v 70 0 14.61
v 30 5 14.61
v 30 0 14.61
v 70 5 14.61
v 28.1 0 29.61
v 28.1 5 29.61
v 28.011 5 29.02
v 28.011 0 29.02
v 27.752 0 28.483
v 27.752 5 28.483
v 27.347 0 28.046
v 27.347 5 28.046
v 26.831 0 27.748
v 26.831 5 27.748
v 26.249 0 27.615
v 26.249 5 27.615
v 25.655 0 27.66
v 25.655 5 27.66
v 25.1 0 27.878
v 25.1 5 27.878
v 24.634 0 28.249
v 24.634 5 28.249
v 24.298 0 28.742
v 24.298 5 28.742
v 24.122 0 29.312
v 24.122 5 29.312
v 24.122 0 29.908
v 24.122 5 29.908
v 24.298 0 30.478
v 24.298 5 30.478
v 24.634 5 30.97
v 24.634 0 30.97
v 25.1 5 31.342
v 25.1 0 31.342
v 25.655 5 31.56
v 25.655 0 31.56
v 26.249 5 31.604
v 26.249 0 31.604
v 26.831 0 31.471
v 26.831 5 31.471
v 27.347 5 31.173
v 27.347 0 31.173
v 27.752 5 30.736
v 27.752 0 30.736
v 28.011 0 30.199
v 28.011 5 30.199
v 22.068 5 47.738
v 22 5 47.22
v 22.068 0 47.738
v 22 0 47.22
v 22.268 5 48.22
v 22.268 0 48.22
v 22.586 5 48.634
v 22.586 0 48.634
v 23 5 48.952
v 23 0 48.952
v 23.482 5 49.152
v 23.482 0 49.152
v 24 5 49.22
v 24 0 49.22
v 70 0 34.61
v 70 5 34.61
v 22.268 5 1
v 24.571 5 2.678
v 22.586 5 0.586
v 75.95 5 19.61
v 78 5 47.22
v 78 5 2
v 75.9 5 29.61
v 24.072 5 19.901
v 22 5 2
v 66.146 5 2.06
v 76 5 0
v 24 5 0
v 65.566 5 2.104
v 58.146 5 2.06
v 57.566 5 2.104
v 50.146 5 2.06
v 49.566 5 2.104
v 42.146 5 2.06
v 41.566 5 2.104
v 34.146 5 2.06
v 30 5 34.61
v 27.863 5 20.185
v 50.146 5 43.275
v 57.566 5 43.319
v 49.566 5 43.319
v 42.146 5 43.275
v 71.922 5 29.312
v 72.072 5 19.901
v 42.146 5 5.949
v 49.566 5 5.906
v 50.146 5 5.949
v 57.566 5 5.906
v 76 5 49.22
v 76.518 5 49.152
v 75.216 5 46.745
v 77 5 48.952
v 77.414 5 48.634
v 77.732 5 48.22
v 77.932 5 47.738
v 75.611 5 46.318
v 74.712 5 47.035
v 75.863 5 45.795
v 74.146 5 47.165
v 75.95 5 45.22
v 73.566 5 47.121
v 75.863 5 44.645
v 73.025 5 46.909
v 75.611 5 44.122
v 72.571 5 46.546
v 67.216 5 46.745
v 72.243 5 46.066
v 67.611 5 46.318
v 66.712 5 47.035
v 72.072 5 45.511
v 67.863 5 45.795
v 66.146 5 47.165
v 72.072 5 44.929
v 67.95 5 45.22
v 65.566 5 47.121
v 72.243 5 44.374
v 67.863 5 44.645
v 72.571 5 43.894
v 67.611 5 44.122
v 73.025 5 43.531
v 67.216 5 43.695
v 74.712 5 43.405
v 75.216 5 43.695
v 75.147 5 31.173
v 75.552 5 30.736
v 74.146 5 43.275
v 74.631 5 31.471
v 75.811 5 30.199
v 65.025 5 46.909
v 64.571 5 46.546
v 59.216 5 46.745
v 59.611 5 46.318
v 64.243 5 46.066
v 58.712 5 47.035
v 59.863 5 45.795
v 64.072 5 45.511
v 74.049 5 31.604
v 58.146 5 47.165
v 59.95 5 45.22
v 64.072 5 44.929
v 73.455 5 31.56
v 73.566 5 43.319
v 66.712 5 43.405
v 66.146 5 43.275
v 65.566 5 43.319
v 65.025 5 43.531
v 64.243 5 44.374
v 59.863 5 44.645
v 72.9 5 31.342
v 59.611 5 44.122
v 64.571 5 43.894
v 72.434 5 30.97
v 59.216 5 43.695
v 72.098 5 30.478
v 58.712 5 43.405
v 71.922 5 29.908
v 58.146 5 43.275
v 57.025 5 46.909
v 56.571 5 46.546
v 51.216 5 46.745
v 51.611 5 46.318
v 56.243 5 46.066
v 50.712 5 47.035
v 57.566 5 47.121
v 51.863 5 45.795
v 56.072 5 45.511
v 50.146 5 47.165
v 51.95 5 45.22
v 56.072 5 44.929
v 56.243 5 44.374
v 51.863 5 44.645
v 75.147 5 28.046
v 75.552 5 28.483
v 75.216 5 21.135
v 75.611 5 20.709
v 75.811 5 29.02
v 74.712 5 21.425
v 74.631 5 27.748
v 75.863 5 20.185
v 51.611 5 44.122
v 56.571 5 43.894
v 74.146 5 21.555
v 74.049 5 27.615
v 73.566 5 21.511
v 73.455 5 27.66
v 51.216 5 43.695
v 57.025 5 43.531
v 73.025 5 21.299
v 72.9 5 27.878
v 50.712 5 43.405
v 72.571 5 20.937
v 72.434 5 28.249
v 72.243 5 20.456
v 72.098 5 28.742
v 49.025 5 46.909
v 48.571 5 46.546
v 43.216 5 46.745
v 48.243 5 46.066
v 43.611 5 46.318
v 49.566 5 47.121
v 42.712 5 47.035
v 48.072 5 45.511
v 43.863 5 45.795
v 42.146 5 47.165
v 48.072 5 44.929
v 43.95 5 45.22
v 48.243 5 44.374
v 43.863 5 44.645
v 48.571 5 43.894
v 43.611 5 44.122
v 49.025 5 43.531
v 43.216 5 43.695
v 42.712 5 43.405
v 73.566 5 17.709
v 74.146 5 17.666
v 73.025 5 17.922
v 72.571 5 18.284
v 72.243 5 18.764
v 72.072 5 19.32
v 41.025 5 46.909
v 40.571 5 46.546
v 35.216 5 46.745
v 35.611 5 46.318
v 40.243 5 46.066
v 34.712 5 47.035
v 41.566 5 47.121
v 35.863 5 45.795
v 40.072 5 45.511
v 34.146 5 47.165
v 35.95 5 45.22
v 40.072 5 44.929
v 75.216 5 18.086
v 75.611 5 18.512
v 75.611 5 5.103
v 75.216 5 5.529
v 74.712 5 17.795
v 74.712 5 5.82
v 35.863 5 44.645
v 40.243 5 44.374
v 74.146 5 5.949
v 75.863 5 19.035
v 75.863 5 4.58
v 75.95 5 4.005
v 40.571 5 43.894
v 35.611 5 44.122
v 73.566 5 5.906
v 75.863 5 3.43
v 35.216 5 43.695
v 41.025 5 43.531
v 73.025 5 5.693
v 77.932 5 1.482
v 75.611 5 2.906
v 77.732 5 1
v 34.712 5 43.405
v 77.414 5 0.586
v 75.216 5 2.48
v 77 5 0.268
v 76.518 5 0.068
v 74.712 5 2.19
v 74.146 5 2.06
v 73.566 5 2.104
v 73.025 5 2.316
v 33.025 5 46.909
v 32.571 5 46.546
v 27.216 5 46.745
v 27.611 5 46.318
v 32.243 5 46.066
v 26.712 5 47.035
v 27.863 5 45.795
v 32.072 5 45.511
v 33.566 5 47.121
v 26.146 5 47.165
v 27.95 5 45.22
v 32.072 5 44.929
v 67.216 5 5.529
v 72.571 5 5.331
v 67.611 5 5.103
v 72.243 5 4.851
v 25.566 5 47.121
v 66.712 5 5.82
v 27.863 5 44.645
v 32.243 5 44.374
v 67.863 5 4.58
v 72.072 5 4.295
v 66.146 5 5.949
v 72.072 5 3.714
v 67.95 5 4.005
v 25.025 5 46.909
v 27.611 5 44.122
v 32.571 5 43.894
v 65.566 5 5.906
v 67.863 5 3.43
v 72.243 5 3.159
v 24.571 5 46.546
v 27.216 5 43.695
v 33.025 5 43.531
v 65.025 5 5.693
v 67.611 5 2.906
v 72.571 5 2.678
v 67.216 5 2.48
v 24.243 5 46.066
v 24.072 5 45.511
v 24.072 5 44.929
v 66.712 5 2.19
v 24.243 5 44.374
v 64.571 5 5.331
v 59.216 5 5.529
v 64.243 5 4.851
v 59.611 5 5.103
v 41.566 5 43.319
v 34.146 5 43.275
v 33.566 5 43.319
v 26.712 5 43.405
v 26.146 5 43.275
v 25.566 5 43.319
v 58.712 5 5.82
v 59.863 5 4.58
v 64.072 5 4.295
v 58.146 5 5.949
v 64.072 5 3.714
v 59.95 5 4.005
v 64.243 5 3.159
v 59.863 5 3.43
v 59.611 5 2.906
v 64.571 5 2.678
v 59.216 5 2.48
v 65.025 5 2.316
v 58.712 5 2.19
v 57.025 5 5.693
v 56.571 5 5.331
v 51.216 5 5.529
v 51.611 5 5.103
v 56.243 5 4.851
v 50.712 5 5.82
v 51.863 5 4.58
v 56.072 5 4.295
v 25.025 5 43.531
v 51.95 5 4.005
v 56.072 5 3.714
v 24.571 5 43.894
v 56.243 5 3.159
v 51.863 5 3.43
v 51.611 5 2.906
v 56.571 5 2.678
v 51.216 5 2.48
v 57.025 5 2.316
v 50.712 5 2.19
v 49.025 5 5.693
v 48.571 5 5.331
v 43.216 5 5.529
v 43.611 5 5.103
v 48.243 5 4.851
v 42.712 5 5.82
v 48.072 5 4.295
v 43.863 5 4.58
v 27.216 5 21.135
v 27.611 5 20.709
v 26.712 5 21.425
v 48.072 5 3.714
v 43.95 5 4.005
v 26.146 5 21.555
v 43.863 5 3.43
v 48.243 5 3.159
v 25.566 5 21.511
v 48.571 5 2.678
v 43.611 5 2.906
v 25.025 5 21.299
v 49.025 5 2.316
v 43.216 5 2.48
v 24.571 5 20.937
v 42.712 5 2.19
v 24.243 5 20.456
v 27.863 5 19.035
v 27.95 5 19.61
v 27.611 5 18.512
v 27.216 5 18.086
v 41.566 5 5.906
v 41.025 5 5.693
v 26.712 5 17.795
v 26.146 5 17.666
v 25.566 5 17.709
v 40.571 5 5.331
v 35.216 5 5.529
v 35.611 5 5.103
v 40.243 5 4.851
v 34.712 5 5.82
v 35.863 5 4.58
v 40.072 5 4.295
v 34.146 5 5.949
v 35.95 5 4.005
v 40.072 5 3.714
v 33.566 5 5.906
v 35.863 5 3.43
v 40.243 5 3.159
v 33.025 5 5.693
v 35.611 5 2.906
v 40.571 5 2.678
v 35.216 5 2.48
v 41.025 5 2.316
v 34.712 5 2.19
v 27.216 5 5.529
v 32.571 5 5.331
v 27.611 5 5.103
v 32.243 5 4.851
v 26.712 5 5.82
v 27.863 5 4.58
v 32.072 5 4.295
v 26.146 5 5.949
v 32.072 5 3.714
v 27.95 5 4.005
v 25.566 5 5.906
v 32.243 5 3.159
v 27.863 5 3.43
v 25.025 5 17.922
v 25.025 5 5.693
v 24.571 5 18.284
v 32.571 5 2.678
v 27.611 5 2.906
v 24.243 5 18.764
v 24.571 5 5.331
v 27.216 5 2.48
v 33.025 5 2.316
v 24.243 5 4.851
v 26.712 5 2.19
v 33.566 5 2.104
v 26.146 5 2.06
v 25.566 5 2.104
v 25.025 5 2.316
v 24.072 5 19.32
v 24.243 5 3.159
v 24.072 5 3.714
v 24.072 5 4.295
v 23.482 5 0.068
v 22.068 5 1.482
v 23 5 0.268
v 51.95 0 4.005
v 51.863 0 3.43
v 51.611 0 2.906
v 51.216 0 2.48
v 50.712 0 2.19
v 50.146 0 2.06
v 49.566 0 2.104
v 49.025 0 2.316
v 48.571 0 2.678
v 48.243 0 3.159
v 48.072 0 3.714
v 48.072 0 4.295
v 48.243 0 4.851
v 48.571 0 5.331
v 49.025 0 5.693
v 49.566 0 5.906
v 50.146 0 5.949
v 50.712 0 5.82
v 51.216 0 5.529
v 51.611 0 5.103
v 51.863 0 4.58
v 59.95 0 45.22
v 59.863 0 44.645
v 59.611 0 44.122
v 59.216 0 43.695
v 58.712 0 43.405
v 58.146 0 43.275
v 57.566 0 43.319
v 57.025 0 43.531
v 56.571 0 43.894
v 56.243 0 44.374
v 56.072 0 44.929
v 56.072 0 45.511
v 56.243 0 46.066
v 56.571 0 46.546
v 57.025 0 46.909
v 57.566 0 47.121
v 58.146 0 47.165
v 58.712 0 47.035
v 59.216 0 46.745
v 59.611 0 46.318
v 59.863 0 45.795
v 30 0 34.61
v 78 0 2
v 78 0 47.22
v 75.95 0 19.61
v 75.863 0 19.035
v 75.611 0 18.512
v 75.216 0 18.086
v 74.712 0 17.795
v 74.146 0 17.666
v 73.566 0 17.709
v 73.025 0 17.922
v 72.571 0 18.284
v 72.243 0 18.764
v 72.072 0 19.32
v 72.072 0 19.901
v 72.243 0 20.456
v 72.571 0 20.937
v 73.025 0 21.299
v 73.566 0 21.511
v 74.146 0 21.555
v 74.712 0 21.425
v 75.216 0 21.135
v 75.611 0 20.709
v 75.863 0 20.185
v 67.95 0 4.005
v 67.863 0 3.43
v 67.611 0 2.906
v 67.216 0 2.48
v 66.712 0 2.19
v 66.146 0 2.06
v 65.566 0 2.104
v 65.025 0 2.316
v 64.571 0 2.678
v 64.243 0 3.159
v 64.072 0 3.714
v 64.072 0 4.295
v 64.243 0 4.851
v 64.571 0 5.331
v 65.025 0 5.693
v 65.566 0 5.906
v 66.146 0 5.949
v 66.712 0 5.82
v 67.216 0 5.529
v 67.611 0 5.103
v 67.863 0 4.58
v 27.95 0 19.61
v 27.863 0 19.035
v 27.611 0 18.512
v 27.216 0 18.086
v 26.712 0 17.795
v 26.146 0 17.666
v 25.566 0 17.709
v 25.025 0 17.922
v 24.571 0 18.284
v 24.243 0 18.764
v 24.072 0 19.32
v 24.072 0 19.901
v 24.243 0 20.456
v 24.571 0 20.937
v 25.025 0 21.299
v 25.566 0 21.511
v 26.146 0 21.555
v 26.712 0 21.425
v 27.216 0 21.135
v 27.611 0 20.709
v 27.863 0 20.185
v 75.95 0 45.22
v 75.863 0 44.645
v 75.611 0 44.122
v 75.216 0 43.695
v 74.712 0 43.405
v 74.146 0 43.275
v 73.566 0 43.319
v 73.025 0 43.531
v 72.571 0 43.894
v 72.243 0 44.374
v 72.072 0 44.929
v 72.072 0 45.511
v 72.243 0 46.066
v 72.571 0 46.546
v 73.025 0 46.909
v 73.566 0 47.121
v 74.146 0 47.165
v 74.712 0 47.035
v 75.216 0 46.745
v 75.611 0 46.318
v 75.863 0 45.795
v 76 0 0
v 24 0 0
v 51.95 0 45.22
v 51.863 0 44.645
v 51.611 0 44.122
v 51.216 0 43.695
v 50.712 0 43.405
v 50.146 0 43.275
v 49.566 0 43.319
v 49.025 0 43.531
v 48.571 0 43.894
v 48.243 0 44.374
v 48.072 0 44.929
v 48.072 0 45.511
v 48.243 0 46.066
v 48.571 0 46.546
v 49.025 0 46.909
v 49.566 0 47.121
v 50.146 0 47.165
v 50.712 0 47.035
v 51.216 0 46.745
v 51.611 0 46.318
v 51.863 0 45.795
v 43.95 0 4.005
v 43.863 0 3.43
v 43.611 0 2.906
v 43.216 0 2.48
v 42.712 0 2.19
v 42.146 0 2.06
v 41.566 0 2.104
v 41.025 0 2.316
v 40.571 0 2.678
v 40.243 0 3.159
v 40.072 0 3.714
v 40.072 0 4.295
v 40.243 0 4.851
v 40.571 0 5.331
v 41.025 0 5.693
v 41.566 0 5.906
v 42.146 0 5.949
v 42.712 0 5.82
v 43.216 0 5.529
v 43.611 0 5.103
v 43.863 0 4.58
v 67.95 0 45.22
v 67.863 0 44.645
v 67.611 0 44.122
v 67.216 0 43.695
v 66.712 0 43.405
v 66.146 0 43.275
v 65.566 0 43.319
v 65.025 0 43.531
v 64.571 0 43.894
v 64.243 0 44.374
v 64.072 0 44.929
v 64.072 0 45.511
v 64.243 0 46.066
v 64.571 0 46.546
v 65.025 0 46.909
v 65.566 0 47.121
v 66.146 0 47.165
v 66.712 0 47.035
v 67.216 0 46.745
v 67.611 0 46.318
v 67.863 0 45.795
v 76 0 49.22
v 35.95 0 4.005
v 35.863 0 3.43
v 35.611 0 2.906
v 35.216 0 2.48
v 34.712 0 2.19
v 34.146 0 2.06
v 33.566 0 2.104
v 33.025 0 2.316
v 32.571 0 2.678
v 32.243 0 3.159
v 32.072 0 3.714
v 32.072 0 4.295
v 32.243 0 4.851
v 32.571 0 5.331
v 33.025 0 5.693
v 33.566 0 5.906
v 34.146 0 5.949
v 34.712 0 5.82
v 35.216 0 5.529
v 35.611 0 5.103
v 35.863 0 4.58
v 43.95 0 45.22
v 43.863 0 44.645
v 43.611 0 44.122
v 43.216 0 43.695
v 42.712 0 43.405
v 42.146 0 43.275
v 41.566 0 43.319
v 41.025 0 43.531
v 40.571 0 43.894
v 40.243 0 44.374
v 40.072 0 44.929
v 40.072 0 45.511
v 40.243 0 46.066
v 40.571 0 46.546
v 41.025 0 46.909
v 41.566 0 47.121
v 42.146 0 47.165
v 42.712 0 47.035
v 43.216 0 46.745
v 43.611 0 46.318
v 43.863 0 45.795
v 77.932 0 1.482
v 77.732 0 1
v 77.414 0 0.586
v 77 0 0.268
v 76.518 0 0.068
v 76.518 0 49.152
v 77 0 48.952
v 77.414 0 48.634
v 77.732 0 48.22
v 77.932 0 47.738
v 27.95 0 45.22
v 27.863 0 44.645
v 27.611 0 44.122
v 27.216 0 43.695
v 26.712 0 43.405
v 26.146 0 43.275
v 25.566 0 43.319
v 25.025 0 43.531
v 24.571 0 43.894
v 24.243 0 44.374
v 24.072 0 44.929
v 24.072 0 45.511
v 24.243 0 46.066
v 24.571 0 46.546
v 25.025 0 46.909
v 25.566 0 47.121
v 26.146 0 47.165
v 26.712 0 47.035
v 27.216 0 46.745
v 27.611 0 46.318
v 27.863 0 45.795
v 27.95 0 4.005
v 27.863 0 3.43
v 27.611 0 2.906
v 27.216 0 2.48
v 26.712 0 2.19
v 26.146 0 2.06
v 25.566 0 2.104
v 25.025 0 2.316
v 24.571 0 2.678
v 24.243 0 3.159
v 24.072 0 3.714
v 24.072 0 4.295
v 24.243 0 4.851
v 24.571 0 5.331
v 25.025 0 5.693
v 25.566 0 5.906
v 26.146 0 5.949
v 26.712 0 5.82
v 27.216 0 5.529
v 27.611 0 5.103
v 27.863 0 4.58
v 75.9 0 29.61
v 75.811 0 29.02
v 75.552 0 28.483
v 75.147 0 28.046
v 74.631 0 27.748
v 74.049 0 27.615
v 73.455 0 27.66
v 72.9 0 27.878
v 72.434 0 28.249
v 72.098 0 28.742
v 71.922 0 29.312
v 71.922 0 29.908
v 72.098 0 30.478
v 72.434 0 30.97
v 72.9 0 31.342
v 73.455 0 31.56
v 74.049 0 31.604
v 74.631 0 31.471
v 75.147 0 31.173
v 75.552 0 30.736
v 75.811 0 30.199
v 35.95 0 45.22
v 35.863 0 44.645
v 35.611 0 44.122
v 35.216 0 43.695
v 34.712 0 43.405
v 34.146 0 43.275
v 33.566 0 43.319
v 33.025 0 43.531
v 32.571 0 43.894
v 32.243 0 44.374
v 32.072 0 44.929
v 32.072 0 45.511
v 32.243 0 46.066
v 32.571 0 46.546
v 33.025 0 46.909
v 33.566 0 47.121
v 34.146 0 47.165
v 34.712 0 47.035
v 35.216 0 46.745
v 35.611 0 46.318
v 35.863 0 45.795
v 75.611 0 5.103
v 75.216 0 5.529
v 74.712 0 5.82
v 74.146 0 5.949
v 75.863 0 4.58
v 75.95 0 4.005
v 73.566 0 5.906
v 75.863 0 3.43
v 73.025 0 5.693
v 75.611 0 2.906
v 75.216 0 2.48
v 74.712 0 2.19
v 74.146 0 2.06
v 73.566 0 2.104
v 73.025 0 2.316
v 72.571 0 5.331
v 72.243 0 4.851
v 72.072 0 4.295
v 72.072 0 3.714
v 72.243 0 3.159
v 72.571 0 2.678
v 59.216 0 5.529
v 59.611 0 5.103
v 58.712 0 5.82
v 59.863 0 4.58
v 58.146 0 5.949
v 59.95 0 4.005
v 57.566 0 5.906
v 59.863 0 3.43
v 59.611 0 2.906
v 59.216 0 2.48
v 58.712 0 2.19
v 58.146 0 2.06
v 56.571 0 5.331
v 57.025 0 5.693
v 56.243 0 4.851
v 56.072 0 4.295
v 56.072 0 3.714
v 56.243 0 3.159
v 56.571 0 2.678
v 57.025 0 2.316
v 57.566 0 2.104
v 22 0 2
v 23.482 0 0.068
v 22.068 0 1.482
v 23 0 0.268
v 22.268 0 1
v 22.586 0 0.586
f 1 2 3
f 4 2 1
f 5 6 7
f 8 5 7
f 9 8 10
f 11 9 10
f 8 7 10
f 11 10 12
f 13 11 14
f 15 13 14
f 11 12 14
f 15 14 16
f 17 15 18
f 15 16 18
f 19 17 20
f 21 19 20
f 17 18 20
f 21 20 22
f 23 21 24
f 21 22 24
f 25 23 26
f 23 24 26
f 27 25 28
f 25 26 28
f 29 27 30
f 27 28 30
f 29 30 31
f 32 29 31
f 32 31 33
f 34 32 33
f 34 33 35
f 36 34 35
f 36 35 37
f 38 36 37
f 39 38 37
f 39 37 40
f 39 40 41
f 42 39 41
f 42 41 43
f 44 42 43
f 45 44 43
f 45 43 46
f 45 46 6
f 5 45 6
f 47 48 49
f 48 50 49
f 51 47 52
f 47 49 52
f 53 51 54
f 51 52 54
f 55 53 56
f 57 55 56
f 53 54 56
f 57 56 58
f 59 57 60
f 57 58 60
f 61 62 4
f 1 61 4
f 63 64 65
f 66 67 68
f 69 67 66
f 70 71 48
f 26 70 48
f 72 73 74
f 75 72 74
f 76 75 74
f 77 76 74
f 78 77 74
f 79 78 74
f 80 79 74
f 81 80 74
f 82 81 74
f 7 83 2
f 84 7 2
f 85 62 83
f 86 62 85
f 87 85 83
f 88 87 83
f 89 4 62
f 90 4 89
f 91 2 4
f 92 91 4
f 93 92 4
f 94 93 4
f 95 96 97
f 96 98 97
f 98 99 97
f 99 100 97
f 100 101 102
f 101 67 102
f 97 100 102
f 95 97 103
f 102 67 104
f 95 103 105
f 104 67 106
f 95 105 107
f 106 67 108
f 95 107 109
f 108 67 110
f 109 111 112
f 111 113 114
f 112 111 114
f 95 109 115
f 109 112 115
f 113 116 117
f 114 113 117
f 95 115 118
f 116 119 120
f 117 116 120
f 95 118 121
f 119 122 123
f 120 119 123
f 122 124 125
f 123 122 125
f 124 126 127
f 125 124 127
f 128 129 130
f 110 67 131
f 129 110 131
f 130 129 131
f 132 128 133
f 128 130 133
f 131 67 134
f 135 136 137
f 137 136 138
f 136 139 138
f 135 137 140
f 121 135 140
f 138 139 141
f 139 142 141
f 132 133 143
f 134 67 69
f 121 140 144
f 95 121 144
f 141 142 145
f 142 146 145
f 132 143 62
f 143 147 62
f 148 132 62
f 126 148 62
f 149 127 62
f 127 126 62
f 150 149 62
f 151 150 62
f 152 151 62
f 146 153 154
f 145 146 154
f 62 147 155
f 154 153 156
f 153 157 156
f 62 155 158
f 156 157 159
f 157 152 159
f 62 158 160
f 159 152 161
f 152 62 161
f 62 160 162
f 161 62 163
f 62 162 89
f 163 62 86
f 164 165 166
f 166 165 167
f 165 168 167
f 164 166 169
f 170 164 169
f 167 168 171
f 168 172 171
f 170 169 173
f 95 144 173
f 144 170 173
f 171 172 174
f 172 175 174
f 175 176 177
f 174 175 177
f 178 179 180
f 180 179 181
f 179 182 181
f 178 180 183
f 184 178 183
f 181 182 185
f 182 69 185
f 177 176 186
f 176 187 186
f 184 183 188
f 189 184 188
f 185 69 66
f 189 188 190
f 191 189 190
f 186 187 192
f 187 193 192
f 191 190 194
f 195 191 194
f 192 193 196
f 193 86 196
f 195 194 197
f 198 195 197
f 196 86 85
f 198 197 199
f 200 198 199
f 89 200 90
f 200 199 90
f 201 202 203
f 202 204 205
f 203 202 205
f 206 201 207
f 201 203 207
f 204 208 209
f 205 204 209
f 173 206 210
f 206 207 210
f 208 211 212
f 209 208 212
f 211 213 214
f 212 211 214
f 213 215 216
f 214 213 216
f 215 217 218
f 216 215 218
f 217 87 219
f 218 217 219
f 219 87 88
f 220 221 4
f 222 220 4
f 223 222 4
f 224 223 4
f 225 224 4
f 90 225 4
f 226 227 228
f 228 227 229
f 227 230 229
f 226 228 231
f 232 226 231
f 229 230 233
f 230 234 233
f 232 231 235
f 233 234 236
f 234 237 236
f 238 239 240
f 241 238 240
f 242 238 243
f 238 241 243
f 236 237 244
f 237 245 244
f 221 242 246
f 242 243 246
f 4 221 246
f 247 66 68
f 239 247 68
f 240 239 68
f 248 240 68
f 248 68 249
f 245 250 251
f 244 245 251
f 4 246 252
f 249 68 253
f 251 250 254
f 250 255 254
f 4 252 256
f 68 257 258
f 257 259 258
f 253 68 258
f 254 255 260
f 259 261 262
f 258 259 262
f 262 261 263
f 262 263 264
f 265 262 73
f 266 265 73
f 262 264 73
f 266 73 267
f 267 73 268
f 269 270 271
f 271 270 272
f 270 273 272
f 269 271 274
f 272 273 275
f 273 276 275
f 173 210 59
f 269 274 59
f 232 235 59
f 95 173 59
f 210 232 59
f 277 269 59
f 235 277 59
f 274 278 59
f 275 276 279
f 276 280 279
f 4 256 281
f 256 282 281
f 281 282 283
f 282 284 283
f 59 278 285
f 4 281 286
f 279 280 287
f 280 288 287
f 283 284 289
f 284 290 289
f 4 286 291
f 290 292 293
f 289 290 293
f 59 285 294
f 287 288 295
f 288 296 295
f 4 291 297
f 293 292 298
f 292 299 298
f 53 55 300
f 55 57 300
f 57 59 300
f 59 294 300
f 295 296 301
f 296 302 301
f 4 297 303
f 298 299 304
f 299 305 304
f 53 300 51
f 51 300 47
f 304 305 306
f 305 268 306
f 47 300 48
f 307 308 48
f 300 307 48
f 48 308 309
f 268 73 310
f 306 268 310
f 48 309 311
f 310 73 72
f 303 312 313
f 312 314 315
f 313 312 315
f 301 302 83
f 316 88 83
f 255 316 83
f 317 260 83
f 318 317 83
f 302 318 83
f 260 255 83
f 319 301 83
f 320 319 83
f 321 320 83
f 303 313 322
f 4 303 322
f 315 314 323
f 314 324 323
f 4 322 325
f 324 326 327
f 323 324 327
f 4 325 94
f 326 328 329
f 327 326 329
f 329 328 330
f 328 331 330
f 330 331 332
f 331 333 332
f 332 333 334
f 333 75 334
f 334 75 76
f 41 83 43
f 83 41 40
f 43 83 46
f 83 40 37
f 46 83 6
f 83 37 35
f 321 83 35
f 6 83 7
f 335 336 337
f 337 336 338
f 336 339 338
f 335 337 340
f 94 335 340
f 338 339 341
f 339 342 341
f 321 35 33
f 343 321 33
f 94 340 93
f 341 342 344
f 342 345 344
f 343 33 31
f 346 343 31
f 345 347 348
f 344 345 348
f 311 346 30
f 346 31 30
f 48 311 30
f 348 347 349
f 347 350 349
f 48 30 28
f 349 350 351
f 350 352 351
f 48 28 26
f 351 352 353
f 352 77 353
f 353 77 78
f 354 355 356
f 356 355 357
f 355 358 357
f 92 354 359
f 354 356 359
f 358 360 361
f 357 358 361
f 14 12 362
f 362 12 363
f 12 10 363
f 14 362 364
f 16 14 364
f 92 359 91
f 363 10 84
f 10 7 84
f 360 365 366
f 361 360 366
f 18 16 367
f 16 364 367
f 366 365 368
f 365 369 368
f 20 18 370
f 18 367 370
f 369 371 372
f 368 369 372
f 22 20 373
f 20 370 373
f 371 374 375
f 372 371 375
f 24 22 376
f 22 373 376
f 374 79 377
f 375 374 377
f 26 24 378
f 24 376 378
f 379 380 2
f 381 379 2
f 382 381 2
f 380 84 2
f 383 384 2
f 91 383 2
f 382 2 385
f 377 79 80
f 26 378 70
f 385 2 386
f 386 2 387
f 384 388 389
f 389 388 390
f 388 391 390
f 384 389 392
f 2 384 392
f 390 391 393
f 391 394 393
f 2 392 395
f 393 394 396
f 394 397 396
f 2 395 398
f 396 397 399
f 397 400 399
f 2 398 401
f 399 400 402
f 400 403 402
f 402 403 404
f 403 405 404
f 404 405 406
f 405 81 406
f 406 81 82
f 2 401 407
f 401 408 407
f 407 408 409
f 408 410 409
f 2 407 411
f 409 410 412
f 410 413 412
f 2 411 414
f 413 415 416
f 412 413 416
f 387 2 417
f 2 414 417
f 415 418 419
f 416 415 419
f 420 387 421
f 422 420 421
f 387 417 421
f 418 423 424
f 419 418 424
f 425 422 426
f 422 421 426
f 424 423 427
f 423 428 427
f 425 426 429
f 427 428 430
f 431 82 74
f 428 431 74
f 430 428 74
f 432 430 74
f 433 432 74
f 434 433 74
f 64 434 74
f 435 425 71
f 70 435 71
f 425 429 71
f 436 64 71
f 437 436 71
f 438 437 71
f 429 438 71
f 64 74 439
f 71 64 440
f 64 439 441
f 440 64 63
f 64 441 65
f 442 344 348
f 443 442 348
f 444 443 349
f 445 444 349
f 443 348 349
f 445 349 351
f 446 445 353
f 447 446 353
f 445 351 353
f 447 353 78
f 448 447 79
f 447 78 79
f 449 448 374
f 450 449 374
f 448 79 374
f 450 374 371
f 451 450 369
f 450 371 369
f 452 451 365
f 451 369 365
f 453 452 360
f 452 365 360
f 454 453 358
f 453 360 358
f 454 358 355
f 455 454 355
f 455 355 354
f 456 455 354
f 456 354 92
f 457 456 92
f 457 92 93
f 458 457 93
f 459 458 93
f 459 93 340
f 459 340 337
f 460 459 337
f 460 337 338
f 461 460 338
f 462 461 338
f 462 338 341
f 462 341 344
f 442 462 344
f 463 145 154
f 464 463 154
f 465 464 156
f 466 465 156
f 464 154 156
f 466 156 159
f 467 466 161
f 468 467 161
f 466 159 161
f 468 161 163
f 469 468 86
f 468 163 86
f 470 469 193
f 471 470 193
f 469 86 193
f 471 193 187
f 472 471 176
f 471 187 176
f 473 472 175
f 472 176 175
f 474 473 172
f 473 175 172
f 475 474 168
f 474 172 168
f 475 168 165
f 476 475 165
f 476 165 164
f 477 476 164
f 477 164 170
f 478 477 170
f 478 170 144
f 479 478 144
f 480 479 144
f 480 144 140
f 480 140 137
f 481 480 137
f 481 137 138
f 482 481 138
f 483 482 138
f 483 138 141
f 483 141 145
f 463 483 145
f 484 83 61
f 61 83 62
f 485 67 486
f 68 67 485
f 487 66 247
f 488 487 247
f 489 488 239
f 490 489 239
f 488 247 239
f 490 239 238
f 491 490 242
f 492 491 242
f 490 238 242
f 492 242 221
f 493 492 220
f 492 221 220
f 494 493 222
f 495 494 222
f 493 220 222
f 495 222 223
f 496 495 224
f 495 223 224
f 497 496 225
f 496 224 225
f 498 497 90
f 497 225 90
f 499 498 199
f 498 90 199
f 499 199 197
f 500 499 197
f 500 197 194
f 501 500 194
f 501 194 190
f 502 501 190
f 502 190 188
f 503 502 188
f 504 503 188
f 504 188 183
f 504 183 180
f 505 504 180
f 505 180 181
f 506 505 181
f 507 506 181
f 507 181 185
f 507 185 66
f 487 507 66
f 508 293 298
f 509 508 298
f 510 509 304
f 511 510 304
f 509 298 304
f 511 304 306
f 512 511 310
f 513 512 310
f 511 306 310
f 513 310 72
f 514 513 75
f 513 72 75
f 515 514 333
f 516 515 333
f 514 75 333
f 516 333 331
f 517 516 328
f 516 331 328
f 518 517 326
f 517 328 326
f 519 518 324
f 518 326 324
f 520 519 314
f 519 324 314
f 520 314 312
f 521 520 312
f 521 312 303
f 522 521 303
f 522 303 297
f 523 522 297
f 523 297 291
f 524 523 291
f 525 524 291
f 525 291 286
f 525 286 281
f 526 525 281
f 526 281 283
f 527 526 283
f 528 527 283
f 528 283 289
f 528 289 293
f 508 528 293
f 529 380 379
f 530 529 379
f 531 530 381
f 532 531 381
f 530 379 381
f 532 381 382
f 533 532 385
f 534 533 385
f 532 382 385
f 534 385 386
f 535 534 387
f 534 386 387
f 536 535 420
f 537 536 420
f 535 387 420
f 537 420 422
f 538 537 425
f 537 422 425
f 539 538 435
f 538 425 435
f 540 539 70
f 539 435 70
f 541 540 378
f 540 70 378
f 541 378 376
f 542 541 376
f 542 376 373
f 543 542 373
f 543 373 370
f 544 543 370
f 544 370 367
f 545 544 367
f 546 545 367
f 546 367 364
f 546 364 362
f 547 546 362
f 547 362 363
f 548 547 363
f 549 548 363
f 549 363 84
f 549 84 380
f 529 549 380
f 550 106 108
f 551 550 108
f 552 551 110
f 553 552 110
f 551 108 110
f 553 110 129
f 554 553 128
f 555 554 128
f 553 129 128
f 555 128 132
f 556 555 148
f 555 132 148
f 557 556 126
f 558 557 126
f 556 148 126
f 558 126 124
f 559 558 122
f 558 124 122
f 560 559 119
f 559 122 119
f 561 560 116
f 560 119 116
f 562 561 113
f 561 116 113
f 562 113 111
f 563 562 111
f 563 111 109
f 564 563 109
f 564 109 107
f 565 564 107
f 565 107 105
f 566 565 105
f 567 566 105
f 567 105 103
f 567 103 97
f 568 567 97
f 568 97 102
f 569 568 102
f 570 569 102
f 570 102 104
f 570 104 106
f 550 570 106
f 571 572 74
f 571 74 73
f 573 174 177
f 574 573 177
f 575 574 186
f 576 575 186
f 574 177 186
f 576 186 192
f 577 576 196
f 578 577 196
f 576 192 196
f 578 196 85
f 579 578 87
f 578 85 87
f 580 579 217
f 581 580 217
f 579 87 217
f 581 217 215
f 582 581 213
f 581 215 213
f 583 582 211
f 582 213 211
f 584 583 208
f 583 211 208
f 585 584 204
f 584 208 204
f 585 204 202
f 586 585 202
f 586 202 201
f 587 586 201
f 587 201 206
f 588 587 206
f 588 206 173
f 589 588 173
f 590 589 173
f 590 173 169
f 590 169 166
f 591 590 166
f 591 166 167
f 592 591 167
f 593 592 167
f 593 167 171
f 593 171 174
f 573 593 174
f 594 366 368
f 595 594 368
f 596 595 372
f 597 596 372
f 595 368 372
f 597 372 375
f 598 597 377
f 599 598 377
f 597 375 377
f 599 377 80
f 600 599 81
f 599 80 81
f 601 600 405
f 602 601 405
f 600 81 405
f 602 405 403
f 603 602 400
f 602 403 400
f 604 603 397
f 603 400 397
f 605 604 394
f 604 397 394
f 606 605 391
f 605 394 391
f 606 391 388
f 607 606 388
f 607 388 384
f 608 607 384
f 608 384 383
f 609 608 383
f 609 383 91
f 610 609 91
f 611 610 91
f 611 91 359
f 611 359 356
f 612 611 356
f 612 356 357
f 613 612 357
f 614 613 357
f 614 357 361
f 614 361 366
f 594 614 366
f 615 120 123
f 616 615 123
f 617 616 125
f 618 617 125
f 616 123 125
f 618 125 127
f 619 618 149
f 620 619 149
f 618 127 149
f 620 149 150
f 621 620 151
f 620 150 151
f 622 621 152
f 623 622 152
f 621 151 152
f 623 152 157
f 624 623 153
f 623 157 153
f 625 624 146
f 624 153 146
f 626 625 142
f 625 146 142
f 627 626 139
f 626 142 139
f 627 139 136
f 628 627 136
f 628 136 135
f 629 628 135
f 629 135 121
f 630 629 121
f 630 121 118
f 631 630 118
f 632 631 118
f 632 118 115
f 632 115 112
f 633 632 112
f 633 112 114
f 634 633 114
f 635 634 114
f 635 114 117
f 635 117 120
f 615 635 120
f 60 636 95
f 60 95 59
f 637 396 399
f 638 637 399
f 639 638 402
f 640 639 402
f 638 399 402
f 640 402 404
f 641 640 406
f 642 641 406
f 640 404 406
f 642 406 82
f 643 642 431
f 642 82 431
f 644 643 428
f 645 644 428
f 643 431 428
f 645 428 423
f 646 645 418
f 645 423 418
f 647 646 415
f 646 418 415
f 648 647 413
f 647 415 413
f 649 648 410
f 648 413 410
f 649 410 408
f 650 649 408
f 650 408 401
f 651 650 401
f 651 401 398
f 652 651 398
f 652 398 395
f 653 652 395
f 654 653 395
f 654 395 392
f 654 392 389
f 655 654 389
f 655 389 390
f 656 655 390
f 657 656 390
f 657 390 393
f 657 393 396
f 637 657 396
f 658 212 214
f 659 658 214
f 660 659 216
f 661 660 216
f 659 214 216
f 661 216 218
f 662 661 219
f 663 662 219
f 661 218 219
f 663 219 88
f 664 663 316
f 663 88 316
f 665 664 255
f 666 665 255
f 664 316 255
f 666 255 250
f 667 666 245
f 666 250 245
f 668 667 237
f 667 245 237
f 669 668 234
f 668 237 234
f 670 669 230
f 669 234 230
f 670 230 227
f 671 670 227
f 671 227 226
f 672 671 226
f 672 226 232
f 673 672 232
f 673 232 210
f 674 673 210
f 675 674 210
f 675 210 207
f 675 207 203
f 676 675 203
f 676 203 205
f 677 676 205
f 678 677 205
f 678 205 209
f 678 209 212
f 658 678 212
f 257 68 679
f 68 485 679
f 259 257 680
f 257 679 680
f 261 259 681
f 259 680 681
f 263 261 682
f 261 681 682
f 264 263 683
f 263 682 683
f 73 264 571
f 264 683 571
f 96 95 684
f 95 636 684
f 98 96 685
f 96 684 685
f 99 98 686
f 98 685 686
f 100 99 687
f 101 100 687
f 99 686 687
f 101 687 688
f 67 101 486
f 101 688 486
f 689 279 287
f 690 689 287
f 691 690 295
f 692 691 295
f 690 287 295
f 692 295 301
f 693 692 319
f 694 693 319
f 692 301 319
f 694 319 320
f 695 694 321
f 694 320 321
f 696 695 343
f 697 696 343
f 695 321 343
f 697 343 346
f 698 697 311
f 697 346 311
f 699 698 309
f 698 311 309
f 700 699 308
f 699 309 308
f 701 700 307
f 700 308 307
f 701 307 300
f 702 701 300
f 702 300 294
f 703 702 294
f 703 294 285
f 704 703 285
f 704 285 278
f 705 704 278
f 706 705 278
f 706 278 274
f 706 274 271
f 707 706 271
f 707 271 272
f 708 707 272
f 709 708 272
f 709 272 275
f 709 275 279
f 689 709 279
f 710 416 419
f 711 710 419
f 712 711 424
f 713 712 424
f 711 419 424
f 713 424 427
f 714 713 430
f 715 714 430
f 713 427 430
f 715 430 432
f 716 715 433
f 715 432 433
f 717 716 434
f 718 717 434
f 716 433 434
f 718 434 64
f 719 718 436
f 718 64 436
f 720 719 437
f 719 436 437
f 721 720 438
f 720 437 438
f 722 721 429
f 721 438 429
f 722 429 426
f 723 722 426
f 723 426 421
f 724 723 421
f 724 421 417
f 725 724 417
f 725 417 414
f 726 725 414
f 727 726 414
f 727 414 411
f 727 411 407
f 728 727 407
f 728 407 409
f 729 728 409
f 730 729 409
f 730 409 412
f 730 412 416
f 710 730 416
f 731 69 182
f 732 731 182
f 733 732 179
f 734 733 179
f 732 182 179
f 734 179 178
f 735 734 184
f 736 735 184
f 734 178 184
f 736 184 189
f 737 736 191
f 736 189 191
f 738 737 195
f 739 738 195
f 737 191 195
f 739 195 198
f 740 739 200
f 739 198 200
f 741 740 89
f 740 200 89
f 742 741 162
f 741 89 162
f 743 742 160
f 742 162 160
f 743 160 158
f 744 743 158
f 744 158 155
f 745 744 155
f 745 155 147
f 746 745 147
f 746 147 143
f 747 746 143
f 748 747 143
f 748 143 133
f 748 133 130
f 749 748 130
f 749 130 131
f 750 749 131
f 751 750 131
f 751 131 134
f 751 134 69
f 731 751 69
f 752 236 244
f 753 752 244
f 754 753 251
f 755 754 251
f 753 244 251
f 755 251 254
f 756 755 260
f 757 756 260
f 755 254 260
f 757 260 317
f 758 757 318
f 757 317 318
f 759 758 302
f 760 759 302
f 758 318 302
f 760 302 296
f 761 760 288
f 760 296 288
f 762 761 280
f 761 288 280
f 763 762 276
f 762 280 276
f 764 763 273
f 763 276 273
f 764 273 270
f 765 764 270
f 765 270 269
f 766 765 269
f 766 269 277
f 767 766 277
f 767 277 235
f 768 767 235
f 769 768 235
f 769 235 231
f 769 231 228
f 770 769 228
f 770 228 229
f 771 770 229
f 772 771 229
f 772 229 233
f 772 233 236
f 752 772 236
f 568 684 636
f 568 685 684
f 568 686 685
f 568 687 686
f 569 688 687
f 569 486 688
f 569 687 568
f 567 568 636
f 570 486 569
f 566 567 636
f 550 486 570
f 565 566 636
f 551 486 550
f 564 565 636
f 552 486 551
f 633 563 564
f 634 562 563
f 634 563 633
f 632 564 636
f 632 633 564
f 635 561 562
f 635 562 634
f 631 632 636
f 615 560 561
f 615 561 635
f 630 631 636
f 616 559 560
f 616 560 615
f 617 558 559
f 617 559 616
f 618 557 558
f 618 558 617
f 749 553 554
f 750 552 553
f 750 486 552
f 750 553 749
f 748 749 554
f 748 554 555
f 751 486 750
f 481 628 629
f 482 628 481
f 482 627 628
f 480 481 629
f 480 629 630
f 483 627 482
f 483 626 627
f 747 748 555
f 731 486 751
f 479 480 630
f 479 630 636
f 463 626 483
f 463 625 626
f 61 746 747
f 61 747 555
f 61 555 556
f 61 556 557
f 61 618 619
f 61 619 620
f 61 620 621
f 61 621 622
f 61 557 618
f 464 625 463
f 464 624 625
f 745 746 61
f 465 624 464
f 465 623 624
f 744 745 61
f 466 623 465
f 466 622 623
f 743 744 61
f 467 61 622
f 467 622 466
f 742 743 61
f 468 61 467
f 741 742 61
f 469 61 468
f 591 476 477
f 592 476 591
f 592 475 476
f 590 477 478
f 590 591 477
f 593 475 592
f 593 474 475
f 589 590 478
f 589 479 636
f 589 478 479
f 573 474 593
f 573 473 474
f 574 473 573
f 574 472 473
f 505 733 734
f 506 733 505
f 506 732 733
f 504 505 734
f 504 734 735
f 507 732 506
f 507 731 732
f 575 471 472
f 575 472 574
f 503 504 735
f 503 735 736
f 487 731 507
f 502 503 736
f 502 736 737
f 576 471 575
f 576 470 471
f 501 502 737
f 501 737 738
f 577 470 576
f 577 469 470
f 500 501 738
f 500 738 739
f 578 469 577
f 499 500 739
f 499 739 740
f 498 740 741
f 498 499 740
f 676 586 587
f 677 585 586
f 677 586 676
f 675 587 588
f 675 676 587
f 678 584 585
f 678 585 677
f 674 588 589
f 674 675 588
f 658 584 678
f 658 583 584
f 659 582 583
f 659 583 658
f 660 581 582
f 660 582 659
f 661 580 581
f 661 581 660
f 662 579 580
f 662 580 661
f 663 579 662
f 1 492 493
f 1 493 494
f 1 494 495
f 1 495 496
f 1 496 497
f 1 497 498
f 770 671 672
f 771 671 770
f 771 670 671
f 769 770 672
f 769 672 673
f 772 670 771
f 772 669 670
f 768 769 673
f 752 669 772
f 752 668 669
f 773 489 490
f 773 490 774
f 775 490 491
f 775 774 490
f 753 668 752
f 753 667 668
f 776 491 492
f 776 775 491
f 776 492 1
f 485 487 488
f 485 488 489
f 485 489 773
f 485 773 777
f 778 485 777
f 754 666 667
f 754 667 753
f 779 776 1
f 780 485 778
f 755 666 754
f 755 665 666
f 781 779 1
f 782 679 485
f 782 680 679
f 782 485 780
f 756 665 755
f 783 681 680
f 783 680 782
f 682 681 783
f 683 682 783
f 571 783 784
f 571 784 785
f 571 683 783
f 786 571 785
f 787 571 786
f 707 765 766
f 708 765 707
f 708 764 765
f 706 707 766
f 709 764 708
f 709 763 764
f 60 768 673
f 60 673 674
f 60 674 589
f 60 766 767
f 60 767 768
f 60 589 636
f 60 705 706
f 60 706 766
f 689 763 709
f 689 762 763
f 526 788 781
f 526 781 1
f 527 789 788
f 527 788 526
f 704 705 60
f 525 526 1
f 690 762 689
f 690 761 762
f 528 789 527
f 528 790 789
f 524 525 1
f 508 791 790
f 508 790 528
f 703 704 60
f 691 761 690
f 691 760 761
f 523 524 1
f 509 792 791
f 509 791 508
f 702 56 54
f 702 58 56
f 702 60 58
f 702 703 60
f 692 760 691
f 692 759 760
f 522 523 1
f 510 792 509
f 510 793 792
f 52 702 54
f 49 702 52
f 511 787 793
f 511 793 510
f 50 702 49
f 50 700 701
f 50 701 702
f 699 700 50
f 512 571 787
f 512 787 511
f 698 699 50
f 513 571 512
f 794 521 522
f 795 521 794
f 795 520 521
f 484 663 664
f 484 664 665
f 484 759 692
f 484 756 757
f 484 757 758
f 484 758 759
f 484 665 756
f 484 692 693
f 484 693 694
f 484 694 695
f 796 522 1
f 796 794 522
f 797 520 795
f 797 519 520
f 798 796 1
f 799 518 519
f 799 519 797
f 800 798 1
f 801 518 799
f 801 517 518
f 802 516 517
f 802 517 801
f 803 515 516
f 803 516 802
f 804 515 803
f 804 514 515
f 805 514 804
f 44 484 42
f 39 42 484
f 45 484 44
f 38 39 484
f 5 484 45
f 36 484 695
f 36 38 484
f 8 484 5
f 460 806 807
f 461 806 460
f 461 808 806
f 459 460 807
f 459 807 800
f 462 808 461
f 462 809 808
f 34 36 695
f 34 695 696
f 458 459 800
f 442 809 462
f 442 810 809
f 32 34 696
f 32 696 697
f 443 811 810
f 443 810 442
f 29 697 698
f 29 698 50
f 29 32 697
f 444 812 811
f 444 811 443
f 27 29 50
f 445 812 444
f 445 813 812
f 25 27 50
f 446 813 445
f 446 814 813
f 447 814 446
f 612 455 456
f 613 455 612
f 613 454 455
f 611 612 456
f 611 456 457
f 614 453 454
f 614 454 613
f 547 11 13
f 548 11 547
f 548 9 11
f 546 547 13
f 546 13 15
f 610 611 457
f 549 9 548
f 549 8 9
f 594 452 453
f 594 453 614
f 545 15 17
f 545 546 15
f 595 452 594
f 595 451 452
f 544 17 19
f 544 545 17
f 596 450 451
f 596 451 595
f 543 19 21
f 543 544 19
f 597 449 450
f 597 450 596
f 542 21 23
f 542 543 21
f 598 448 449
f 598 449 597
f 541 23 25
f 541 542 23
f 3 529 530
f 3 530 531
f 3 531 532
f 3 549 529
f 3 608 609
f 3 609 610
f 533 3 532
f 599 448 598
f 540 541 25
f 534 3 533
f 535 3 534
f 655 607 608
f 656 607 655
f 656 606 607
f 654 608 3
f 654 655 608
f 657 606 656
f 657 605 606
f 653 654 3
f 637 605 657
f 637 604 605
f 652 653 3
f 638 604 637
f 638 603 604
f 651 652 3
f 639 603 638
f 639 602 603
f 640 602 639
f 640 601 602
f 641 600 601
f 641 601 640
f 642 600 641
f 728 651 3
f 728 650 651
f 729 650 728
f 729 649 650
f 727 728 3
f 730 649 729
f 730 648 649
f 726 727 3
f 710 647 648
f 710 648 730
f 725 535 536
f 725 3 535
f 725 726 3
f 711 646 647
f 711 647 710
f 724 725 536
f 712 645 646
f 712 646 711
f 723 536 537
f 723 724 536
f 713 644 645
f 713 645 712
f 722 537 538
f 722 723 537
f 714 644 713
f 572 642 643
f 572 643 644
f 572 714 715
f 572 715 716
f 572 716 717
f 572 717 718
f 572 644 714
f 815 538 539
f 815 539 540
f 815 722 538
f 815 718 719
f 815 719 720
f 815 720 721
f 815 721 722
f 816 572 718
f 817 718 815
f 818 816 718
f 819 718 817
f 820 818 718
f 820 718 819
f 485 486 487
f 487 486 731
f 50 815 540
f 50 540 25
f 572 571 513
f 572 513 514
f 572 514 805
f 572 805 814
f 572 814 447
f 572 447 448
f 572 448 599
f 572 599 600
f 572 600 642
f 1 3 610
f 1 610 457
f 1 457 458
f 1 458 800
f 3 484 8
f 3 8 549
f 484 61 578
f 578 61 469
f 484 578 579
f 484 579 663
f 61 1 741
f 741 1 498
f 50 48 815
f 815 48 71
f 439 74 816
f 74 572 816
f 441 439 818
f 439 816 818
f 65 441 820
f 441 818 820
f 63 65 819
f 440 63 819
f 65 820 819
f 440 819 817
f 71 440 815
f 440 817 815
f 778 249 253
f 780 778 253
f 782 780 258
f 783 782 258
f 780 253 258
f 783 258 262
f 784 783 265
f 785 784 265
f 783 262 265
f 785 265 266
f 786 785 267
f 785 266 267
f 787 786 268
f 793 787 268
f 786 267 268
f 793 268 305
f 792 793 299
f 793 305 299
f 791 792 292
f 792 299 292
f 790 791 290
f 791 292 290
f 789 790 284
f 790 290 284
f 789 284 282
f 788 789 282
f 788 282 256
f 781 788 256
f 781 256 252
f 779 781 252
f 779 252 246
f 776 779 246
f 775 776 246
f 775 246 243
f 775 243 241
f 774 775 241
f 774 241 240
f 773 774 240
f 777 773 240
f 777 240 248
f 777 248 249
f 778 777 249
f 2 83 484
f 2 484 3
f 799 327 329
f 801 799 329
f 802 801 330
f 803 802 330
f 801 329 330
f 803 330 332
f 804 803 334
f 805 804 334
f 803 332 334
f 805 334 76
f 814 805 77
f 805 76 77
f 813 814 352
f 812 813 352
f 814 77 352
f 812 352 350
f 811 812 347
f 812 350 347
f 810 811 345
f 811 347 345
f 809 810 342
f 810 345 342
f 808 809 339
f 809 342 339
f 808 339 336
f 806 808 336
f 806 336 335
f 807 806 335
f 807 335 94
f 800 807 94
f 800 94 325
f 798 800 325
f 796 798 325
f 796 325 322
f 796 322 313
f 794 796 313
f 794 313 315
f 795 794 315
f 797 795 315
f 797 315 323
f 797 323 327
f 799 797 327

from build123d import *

# Parameters (mm, degrees)
BOSS_EXTRUDE1_DEPTH = 5
SKETCH2_R           = 1.95
SKETCH2_W           = 40
SKETCH2_H           = 20
CUT_EXTRUDE1_DEPTH  = 6
SKETCH4_W           = 22
SKETCH4_H           = 49.22
CUT_EXTRUDE2_DEPTH  = 10
FILLET1_R           = 2
FILLET2_R           = 2
FILLET3_R           = 2
FILLET4_R           = 2
SKETCH5_R           = 1.95
SKETCH5_R_2         = 2
CUT_EXTRUDE3_DEPTH  = 6


with BuildPart() as part:
    # Sketch1 → Boss-Extrude1 (new body)
    with BuildSketch(Plane(origin=(0, 0, 0), x_dir=(1, 0, 0), z_dir=(0, 1, 0))):
        with BuildLine():
            Line((2, 0), (98, 0))
            ThreePointArc((98, 0), (99.414213562, -0.585786438), (100, -2))
            Line((100, -2), (100, -47.22))
            ThreePointArc((100, -47.22), (99.414213562, -48.634213562), (98, -49.22))
            Line((98, -49.22), (2, -49.22))
            ThreePointArc((2, -49.22), (0.585786438, -48.634213562), (0, -47.22))
            Line((0, -47.22), (0, -2))
            ThreePointArc((0, -2), (0.585786438, -0.585786438), (2, 0))
        make_face()
    extrude(amount=BOSS_EXTRUDE1_DEPTH)

    # Sketch2 → Cut-Extrude1 (cut, through all)
    with BuildSketch(Plane(origin=(0, 5, 0), x_dir=(1, 0, 0), z_dir=(0, 1, 0))):
        with Locations((90, -4.00475022)):
            Circle(SKETCH2_R)
        with Locations((82, -4.00475022)):
            Circle(SKETCH2_R)
        with Locations((18, -4.00475022)):
            Circle(SKETCH2_R)
        with Locations((26, -4.00475022)):
            Circle(SKETCH2_R)
        with Locations((34, -4.00475022)):
            Circle(SKETCH2_R)
        with Locations((42, -4.00475022)):
            Circle(SKETCH2_R)
        with Locations((50, -4.00475022)):
            Circle(SKETCH2_R)
        with Locations((58, -4.00475022)):
            Circle(SKETCH2_R)
        with Locations((66, -4.00475022)):
            Circle(SKETCH2_R)
        with Locations((74, -4.00475022)):
            Circle(SKETCH2_R)
        with Locations((90, -45.22)):
            Circle(SKETCH2_R)
        with Locations((82, -45.22)):
            Circle(SKETCH2_R)
        with Locations((18, -45.22)):
            Circle(SKETCH2_R)
        with Locations((26, -45.22)):
            Circle(SKETCH2_R)
        with Locations((34, -45.22)):
            Circle(SKETCH2_R)
        with Locations((42, -45.22)):
            Circle(SKETCH2_R)
        with Locations((50, -45.22)):
            Circle(SKETCH2_R)
        with Locations((58, -45.22)):
            Circle(SKETCH2_R)
        with Locations((66, -45.22)):
            Circle(SKETCH2_R)
        with Locations((74, -45.22)):
            Circle(SKETCH2_R)
        with Locations((50, -24.61)):
            Rectangle(SKETCH2_W, SKETCH2_H)
    extrude(amount=-CUT_EXTRUDE1_DEPTH, mode=Mode.SUBTRACT)

    # Sketch4 → Cut-Extrude2 (cut)
    with BuildSketch(Plane(origin=(0, 5, 0), x_dir=(1, 0, 0), z_dir=(0, 1, 0))):
        with Locations((89, -24.61)):
            Rectangle(SKETCH4_W, SKETCH4_H)
        with Locations((11, -24.61)):
            Rectangle(SKETCH4_W, SKETCH4_H)
    extrude(amount=-CUT_EXTRUDE2_DEPTH, mode=Mode.SUBTRACT)

    # Fillet1
    fillet1_edges = [part.edges().sort_by_distance(p)[0] for p in [
        (22, 2.5, 0),
    ]]
    fillet(fillet1_edges, radius=FILLET1_R)

    # Fillet2
    fillet2_edges = [part.edges().sort_by_distance(p)[0] for p in [
        (22, 2.5, 49.22),
    ]]
    fillet(fillet2_edges, radius=FILLET2_R)

    # Fillet3
    fillet3_edges = [part.edges().sort_by_distance(p)[0] for p in [
        (78, 2.5, 49.22),
    ]]
    fillet(fillet3_edges, radius=FILLET3_R)

    # Fillet4
    fillet4_edges = [part.edges().sort_by_distance(p)[0] for p in [
        (78, 2.5, 0),
    ]]
    fillet(fillet4_edges, radius=FILLET4_R)

    # Sketch5 → Cut-Extrude3 (cut, through all)
    with BuildSketch(Plane(origin=(0, 5, 0), x_dir=(1, 0, 0), z_dir=(0, 1, 0))):
        with Locations((74, -19.610250006)):
            Circle(SKETCH5_R)
        with Locations((73.9, -29.609749994)):
            Circle(SKETCH5_R_2)
        with Locations((26, -19.610250006)):
            Circle(SKETCH5_R)
        with Locations((26.1, -29.609749994)):
            Circle(SKETCH5_R_2)
    extrude(amount=-CUT_EXTRUDE3_DEPTH, mode=Mode.SUBTRACT)


solid = part.part
